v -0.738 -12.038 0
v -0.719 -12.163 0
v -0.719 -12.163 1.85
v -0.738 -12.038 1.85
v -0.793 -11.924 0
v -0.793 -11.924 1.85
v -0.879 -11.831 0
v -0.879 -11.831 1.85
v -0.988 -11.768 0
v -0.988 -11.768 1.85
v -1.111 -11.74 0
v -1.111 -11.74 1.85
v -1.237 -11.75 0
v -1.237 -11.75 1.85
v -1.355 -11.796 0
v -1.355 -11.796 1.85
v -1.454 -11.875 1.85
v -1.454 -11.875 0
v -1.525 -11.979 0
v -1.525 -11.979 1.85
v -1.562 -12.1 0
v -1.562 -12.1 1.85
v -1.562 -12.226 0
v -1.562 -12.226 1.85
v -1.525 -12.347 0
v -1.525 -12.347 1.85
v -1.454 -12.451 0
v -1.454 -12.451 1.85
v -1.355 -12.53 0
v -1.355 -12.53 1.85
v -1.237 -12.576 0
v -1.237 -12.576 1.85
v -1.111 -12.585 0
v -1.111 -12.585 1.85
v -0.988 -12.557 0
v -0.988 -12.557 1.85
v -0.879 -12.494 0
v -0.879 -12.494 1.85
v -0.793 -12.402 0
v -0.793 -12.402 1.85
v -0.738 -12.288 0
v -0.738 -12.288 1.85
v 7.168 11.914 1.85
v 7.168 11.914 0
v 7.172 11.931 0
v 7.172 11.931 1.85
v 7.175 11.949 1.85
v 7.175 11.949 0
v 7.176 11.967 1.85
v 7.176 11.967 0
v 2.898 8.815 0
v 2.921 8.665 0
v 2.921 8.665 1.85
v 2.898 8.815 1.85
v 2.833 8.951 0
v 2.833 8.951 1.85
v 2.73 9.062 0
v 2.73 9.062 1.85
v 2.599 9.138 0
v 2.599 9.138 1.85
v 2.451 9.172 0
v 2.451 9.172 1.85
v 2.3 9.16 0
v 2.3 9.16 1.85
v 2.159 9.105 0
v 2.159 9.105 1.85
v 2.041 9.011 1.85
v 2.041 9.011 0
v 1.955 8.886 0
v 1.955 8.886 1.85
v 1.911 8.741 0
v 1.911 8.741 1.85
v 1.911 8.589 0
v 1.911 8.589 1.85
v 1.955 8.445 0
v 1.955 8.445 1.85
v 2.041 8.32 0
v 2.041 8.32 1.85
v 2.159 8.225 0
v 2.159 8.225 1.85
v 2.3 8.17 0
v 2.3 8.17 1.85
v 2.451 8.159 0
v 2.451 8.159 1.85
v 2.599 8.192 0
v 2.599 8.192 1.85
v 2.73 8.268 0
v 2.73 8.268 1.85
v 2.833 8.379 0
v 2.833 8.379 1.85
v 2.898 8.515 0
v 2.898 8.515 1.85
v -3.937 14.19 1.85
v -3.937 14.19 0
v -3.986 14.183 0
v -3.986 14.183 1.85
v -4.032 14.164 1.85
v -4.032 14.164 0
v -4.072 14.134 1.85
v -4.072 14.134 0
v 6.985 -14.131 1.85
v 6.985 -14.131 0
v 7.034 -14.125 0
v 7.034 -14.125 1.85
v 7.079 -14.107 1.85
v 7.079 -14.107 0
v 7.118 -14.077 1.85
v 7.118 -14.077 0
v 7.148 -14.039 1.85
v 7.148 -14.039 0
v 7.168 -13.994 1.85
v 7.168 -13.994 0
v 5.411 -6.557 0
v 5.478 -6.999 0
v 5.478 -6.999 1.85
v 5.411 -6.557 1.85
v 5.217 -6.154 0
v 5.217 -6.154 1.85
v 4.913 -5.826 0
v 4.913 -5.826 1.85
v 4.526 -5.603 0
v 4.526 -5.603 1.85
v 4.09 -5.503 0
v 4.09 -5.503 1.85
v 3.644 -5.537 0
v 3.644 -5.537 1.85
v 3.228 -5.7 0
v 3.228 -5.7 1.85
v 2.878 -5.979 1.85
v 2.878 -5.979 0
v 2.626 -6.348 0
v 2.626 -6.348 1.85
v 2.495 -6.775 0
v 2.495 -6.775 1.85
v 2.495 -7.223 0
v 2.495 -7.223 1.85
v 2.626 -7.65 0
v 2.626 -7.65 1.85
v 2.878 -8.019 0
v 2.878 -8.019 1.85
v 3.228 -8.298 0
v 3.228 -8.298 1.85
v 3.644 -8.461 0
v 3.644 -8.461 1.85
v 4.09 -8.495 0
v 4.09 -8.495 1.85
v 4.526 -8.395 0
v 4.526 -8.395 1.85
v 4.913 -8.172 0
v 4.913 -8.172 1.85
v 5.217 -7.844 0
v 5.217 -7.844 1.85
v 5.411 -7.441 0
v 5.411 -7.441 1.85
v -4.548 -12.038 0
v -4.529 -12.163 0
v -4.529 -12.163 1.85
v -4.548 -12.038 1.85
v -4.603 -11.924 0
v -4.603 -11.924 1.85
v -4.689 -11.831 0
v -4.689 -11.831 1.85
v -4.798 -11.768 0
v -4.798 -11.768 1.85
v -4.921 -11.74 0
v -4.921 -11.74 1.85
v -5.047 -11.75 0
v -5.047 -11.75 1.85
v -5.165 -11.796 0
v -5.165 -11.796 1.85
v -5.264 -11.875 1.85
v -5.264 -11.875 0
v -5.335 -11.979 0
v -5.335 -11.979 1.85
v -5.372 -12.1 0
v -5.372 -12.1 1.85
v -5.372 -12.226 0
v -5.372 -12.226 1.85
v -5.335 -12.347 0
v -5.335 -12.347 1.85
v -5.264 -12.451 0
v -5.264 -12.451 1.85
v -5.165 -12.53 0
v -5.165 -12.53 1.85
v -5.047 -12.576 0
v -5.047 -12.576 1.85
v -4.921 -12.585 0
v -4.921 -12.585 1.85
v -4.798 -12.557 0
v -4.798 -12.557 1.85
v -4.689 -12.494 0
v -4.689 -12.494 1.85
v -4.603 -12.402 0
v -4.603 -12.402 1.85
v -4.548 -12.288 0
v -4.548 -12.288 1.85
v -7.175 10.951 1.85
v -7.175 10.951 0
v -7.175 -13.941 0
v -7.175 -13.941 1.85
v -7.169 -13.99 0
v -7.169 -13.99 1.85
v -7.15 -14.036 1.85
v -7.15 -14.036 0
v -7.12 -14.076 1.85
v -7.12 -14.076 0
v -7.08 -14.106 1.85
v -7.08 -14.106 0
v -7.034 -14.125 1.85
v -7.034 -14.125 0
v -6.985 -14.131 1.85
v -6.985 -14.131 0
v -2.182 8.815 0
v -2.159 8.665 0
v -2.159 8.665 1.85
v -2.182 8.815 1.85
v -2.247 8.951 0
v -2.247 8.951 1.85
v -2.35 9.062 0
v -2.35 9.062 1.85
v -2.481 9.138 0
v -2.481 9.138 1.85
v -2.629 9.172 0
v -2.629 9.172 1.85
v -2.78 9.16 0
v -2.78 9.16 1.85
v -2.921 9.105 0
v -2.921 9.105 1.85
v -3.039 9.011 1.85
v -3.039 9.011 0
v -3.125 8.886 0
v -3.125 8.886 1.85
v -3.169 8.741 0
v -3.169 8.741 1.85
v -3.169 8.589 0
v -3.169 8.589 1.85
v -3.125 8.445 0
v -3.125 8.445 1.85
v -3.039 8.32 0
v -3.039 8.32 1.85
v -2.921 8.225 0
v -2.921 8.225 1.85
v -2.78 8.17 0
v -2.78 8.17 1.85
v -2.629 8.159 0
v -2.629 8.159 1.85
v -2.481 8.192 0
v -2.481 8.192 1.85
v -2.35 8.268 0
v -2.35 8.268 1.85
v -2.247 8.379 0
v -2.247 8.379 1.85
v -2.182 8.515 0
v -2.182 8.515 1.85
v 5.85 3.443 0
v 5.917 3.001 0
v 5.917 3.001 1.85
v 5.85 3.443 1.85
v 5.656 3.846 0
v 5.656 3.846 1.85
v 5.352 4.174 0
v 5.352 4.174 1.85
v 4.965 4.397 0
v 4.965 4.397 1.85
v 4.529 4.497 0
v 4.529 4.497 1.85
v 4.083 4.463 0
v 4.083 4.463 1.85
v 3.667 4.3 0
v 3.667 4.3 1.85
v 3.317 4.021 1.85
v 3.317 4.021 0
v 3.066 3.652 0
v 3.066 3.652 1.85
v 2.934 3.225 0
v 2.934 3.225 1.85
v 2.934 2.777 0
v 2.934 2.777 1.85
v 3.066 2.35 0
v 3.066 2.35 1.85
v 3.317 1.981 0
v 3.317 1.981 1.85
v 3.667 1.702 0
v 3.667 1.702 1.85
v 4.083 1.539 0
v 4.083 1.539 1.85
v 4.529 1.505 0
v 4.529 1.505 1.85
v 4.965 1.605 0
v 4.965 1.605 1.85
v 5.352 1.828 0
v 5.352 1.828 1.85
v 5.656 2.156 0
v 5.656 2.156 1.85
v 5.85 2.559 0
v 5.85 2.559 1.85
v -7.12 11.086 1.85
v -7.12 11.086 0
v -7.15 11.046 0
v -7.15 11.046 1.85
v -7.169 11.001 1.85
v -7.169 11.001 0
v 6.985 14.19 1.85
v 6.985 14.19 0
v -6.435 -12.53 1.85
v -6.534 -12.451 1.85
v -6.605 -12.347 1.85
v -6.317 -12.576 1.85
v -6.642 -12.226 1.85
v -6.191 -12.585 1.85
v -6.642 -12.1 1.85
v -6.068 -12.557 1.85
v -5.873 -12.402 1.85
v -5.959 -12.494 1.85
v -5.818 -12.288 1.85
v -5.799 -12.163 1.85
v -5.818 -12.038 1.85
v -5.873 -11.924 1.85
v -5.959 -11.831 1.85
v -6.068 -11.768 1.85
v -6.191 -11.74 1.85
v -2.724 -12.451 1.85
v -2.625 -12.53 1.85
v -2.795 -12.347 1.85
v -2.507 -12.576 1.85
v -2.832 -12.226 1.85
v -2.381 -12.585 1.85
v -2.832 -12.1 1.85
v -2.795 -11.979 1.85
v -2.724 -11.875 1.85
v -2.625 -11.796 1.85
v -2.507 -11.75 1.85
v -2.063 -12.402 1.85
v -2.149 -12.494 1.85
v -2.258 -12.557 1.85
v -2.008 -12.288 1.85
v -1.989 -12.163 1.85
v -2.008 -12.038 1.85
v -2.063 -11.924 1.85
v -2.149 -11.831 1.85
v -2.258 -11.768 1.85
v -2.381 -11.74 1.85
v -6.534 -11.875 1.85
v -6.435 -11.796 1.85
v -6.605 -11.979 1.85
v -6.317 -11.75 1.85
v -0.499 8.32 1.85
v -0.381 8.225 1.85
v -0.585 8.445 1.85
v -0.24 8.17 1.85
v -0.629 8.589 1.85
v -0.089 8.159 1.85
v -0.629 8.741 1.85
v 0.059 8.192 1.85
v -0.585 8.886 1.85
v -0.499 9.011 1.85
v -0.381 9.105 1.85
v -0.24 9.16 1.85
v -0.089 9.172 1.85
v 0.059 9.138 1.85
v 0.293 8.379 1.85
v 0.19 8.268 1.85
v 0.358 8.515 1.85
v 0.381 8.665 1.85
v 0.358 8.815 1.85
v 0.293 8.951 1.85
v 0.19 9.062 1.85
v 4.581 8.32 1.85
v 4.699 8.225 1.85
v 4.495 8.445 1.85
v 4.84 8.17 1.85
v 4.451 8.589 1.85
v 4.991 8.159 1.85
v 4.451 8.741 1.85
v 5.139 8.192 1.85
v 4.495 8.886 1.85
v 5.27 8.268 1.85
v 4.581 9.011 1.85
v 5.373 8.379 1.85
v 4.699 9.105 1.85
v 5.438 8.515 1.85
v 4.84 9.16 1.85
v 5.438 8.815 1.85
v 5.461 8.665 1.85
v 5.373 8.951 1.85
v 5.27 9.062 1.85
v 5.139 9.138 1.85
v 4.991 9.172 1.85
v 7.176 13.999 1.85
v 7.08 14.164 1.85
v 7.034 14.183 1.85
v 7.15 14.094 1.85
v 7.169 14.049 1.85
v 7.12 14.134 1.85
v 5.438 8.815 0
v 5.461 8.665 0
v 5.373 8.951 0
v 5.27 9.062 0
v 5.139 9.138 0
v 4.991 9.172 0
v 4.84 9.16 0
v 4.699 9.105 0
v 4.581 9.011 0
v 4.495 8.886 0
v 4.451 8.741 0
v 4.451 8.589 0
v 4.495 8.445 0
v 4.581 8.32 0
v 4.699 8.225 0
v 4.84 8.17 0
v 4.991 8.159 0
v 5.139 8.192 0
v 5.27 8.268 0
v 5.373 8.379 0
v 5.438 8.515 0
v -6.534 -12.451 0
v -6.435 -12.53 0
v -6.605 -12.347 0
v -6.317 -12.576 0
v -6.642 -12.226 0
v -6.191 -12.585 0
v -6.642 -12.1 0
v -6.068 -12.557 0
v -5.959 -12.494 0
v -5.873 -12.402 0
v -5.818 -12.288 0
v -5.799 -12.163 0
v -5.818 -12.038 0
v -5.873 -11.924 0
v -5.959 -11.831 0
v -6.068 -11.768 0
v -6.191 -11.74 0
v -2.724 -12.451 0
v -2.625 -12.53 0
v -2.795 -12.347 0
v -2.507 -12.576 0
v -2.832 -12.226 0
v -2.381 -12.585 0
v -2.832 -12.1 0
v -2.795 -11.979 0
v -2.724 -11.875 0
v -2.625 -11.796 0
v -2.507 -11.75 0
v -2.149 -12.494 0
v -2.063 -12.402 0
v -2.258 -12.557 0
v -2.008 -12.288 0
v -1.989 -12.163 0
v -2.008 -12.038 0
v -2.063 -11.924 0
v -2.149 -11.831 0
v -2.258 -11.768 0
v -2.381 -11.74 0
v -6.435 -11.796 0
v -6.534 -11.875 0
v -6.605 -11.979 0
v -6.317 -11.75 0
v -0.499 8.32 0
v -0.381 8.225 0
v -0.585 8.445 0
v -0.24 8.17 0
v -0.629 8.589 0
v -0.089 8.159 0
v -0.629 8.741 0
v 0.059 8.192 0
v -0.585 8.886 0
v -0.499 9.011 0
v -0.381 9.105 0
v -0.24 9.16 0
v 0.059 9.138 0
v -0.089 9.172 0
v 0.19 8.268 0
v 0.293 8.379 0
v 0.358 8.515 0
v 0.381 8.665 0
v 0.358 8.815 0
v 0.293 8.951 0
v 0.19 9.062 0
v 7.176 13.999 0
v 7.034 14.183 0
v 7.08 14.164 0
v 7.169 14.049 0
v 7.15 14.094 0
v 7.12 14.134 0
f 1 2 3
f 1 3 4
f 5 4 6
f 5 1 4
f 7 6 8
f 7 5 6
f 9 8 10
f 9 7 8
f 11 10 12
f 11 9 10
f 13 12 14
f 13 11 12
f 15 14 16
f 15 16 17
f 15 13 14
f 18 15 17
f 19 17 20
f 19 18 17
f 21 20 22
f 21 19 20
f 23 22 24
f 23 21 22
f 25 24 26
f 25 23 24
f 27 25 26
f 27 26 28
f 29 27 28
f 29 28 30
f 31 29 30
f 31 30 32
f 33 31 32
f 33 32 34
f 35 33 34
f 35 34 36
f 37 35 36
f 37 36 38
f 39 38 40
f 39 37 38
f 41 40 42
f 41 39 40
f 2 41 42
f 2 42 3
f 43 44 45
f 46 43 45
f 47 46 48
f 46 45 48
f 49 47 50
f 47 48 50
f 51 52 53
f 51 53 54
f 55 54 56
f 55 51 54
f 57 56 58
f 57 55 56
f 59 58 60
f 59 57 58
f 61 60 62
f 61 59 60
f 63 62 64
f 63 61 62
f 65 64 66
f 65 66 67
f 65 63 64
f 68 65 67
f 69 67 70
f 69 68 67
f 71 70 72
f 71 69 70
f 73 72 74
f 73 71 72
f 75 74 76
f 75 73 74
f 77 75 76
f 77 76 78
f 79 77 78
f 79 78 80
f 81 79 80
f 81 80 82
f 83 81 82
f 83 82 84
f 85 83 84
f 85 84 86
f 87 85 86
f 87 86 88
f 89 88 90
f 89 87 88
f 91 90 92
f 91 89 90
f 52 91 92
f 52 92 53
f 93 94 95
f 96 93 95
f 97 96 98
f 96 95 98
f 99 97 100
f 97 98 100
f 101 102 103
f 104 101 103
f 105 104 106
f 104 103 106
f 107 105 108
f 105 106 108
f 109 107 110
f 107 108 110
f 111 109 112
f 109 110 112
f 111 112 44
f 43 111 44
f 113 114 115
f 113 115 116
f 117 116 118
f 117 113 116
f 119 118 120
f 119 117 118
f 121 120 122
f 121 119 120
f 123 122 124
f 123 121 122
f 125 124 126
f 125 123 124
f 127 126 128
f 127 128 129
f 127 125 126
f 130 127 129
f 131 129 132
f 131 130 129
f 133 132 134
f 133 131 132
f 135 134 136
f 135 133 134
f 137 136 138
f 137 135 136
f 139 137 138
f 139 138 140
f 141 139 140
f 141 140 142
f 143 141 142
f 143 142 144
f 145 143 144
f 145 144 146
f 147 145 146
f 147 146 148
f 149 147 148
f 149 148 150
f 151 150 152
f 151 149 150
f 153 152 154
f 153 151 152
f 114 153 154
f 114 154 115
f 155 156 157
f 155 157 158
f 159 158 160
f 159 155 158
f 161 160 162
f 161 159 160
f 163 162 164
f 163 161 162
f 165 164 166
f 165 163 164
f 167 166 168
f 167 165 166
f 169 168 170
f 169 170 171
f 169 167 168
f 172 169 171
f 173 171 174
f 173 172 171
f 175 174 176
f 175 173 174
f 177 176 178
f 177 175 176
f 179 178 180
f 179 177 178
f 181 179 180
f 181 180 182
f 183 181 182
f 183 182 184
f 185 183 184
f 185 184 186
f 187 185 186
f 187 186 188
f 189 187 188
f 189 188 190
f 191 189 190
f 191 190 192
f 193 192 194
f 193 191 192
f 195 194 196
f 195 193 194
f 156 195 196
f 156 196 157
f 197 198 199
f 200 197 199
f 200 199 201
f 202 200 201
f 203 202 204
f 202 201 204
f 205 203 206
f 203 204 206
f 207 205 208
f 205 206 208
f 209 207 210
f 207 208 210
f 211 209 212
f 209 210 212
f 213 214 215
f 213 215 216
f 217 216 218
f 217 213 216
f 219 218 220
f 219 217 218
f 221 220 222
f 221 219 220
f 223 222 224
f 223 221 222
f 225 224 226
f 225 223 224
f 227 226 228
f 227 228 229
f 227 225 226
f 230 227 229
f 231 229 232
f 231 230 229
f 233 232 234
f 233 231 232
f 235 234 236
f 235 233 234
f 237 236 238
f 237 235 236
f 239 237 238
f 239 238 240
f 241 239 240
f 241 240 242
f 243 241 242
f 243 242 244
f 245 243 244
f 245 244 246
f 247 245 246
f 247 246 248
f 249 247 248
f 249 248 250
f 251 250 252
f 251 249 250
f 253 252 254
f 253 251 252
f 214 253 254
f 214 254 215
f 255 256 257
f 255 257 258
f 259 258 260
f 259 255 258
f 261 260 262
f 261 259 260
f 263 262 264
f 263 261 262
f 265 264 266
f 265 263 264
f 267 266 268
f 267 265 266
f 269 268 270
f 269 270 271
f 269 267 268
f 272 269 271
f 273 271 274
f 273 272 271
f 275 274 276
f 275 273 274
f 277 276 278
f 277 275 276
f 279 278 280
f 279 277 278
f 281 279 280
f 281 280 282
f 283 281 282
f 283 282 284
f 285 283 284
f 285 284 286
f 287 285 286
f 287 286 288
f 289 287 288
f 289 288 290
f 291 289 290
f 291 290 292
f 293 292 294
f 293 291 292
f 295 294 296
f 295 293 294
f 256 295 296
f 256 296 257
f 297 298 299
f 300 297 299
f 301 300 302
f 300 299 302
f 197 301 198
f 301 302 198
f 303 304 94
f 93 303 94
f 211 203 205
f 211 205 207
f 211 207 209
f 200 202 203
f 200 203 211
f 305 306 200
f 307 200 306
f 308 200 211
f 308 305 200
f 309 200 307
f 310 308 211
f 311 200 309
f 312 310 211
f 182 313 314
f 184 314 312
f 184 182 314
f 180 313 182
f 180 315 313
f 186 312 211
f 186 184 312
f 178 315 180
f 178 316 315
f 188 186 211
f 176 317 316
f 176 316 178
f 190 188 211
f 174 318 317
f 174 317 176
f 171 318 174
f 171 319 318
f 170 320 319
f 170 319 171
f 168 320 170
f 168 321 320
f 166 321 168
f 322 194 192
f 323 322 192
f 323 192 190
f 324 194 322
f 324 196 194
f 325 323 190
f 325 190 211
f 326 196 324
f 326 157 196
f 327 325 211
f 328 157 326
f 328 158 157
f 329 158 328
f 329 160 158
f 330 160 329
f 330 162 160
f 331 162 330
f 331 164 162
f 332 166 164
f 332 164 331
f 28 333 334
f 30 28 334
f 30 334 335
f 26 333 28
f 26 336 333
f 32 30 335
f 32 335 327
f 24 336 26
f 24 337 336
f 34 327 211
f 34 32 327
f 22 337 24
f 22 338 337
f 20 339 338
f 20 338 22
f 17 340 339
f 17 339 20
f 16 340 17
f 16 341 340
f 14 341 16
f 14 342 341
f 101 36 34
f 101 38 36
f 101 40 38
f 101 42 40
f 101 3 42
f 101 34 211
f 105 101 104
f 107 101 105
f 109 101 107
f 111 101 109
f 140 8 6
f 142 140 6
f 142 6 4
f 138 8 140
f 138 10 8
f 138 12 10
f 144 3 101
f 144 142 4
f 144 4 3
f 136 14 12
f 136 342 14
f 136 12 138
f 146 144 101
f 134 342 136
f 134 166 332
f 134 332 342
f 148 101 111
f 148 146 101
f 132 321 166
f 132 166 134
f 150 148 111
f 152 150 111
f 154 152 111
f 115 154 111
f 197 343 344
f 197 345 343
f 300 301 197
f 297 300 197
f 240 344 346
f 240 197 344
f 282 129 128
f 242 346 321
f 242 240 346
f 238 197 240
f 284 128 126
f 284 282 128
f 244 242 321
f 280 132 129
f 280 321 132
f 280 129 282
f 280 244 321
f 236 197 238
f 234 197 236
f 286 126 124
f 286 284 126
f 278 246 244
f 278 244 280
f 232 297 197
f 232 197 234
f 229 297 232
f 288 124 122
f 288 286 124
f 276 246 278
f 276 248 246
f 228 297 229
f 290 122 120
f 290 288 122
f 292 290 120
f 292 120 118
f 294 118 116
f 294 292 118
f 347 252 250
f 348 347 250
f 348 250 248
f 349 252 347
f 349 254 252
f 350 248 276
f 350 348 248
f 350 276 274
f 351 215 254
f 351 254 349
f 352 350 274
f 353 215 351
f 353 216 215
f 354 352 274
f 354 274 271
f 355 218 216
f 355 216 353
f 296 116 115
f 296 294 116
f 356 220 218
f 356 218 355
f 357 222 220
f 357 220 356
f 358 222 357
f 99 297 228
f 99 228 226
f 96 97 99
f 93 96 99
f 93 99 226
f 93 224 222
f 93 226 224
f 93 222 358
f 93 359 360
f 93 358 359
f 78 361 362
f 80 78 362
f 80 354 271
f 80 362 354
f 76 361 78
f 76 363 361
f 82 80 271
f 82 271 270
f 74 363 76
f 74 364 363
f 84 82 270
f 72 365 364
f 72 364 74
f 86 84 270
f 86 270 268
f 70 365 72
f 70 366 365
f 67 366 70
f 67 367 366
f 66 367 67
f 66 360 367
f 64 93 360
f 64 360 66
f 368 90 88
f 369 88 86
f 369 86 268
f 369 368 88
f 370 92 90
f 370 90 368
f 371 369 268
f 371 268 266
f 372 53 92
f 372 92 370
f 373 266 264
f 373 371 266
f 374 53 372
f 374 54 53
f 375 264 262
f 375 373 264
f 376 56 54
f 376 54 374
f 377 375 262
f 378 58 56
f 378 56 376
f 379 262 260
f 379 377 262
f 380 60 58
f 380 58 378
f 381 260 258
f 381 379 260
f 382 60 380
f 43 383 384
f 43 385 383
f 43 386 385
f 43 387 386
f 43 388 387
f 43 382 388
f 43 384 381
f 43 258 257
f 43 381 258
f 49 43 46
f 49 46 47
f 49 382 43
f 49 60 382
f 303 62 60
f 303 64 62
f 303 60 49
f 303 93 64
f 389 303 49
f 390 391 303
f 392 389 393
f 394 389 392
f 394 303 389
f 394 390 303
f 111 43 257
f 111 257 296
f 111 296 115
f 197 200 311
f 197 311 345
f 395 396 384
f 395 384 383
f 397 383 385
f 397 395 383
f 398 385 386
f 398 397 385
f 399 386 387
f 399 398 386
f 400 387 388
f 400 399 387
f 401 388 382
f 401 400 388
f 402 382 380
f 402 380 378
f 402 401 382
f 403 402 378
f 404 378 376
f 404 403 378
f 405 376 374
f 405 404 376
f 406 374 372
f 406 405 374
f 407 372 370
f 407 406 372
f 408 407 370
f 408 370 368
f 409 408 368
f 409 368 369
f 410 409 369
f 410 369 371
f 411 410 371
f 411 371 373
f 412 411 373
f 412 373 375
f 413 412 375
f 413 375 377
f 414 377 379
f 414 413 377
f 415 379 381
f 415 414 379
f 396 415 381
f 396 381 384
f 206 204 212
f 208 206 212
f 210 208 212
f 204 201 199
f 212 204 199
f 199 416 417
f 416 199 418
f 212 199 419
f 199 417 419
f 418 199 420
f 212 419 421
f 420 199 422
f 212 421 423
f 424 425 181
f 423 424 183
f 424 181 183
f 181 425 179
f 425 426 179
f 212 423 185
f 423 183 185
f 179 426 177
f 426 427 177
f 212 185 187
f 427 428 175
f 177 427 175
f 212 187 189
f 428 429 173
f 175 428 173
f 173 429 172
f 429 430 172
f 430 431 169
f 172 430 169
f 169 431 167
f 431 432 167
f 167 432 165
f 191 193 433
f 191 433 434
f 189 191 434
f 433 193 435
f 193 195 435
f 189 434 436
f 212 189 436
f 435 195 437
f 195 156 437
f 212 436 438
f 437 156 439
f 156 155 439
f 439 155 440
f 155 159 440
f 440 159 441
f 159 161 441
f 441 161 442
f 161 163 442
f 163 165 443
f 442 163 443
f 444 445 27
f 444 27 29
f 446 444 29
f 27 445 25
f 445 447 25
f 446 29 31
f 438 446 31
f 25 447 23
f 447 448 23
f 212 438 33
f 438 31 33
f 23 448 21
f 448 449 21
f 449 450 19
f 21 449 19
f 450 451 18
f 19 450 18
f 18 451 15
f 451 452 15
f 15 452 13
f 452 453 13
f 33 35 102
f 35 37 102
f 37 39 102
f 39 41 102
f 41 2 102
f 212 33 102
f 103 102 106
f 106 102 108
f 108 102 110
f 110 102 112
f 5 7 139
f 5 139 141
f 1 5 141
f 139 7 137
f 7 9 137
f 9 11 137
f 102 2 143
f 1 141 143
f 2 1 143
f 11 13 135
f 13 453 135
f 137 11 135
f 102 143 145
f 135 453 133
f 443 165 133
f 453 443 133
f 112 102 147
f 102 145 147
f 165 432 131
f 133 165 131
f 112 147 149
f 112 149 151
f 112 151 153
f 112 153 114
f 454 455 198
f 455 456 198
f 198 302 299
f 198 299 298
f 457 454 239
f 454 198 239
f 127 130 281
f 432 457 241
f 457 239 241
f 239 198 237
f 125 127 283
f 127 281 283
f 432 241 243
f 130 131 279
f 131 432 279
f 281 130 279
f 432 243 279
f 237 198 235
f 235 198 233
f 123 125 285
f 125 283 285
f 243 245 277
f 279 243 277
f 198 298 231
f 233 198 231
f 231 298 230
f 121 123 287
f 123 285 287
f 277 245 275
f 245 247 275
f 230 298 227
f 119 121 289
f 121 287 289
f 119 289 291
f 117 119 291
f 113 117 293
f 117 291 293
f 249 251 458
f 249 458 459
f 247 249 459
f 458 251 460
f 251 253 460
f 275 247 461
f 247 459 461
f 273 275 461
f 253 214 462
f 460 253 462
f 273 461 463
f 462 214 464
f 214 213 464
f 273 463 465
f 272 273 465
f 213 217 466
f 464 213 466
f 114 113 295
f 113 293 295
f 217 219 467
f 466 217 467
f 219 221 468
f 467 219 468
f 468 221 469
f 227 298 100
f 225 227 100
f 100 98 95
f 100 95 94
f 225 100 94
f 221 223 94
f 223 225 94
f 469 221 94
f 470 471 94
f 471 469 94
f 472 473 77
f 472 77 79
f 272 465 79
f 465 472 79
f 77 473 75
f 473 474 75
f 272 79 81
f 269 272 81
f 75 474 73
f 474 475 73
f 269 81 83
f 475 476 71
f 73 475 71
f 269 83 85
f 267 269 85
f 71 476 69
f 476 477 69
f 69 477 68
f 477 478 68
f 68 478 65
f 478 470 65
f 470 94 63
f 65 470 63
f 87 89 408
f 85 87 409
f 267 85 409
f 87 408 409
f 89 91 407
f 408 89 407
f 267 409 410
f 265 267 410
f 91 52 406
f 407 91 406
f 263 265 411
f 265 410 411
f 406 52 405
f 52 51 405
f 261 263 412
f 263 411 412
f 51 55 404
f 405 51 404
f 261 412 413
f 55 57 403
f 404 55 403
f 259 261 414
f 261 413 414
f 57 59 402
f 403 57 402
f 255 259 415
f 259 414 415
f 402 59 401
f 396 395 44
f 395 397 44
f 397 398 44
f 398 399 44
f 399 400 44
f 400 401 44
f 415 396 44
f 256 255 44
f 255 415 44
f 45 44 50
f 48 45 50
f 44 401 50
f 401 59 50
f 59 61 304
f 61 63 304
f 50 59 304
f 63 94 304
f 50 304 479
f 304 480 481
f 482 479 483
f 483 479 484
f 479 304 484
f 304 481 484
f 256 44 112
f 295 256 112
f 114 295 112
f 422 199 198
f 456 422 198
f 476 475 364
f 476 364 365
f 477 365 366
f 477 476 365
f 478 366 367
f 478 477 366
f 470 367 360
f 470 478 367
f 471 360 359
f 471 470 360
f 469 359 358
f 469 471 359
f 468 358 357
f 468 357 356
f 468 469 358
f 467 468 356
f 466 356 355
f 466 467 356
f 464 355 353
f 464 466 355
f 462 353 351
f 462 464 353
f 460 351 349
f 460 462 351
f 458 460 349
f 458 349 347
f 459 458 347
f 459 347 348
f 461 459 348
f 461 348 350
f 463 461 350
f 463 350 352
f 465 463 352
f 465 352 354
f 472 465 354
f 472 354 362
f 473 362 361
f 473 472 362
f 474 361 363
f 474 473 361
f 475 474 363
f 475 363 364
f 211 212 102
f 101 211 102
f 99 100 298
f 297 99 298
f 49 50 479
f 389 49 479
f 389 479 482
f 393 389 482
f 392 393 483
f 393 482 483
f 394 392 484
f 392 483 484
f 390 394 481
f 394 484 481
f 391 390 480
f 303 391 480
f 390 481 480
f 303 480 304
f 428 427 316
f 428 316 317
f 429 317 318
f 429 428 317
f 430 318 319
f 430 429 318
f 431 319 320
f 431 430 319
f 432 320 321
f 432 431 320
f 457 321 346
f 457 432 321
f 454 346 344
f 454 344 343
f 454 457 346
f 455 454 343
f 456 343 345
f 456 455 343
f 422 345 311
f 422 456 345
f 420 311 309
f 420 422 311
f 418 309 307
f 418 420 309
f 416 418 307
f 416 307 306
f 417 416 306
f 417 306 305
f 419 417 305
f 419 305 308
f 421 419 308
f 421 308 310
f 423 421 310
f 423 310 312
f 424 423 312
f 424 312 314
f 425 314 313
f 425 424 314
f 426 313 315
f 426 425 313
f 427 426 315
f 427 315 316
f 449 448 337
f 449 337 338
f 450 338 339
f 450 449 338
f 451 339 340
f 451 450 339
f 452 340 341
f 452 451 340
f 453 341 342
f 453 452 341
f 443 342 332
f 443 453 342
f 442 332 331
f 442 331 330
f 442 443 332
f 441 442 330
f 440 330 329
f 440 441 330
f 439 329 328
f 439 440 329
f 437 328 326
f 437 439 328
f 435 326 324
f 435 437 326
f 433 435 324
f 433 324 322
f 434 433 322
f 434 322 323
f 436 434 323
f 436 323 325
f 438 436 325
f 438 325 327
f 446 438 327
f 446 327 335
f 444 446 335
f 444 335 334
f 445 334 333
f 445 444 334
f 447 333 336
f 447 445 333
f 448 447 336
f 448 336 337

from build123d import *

# Parameters (mm, degrees)
SKETCH1_R           = 0.423839805
SKETCH1_R_2         = 1.499879549
SKETCH1_R_3         = 0.508
BOSS_EXTRUDE1_DEPTH = 1.85


with BuildPart() as part:
    # Sketch1 → Boss-Extrude1 (new body)
    with BuildSketch(Plane.XY):
        with BuildLine():
            ThreePointArc((-7.175495363, -13.940801921), (-7.119699204, -14.075505763), (-6.984995363, -14.131301921))
            Line((-6.984995363, -14.131301921), (6.985004637, -14.131301921))
            ThreePointArc((6.985004637, -14.131301921), (7.099326594, -14.093185451), (7.1679, -13.994089221))
            Line((7.1679, -13.994089221), (7.1679, 11.913928619))
            ThreePointArc((7.1679, 11.913928619), (7.173590429, 11.94029461), (7.1755, 11.9672))
            Line((7.1755, 11.9672), (7.1755, 13.9992))
            ThreePointArc((7.1755, 13.9992), (7.119703561, 14.133900844), (6.985001921, 14.189695363))
            Line((6.985001921, 14.189695363), (-3.936998079, 14.189695363))
            ThreePointArc((-3.936998079, 14.189695363), (-4.009898233, 14.17519462), (-4.0717, 14.1339))
            Line((-4.0717, 14.1339), (-7.1197, 11.0859))
            ThreePointArc((-7.1197, 11.0859), (-7.16099462, 11.024098233), (-7.175495363, 10.951198079))
            Line((-7.175495363, 10.951198079), (-7.175495363, -13.940801921))
        make_face()
        with Locations((-6.223, -12.1628)):
            Circle(SKETCH1_R, mode=Mode.SUBTRACT)
        with Locations((-4.953, -12.1628)):
            Circle(SKETCH1_R, mode=Mode.SUBTRACT)
        with Locations((-2.413, -12.1628)):
            Circle(SKETCH1_R, mode=Mode.SUBTRACT)
        with Locations((-1.143, -12.1628)):
            Circle(SKETCH1_R, mode=Mode.SUBTRACT)
        with Locations((3.97765, -6.999)):
            Circle(SKETCH1_R_2, mode=Mode.SUBTRACT)
        with Locations((4.416979549, 3.001)):
            Circle(SKETCH1_R_2, mode=Mode.SUBTRACT)
        with Locations((-2.667, 8.6652)):
            Circle(SKETCH1_R_3, mode=Mode.SUBTRACT)
        with Locations((-0.127, 8.6652)):
            Circle(SKETCH1_R_3, mode=Mode.SUBTRACT)
        with Locations((2.413, 8.6652)):
            Circle(SKETCH1_R_3, mode=Mode.SUBTRACT)
        with Locations((4.953, 8.6652)):
            Circle(SKETCH1_R_3, mode=Mode.SUBTRACT)
    extrude(amount=BOSS_EXTRUDE1_DEPTH)


solid = part.part
